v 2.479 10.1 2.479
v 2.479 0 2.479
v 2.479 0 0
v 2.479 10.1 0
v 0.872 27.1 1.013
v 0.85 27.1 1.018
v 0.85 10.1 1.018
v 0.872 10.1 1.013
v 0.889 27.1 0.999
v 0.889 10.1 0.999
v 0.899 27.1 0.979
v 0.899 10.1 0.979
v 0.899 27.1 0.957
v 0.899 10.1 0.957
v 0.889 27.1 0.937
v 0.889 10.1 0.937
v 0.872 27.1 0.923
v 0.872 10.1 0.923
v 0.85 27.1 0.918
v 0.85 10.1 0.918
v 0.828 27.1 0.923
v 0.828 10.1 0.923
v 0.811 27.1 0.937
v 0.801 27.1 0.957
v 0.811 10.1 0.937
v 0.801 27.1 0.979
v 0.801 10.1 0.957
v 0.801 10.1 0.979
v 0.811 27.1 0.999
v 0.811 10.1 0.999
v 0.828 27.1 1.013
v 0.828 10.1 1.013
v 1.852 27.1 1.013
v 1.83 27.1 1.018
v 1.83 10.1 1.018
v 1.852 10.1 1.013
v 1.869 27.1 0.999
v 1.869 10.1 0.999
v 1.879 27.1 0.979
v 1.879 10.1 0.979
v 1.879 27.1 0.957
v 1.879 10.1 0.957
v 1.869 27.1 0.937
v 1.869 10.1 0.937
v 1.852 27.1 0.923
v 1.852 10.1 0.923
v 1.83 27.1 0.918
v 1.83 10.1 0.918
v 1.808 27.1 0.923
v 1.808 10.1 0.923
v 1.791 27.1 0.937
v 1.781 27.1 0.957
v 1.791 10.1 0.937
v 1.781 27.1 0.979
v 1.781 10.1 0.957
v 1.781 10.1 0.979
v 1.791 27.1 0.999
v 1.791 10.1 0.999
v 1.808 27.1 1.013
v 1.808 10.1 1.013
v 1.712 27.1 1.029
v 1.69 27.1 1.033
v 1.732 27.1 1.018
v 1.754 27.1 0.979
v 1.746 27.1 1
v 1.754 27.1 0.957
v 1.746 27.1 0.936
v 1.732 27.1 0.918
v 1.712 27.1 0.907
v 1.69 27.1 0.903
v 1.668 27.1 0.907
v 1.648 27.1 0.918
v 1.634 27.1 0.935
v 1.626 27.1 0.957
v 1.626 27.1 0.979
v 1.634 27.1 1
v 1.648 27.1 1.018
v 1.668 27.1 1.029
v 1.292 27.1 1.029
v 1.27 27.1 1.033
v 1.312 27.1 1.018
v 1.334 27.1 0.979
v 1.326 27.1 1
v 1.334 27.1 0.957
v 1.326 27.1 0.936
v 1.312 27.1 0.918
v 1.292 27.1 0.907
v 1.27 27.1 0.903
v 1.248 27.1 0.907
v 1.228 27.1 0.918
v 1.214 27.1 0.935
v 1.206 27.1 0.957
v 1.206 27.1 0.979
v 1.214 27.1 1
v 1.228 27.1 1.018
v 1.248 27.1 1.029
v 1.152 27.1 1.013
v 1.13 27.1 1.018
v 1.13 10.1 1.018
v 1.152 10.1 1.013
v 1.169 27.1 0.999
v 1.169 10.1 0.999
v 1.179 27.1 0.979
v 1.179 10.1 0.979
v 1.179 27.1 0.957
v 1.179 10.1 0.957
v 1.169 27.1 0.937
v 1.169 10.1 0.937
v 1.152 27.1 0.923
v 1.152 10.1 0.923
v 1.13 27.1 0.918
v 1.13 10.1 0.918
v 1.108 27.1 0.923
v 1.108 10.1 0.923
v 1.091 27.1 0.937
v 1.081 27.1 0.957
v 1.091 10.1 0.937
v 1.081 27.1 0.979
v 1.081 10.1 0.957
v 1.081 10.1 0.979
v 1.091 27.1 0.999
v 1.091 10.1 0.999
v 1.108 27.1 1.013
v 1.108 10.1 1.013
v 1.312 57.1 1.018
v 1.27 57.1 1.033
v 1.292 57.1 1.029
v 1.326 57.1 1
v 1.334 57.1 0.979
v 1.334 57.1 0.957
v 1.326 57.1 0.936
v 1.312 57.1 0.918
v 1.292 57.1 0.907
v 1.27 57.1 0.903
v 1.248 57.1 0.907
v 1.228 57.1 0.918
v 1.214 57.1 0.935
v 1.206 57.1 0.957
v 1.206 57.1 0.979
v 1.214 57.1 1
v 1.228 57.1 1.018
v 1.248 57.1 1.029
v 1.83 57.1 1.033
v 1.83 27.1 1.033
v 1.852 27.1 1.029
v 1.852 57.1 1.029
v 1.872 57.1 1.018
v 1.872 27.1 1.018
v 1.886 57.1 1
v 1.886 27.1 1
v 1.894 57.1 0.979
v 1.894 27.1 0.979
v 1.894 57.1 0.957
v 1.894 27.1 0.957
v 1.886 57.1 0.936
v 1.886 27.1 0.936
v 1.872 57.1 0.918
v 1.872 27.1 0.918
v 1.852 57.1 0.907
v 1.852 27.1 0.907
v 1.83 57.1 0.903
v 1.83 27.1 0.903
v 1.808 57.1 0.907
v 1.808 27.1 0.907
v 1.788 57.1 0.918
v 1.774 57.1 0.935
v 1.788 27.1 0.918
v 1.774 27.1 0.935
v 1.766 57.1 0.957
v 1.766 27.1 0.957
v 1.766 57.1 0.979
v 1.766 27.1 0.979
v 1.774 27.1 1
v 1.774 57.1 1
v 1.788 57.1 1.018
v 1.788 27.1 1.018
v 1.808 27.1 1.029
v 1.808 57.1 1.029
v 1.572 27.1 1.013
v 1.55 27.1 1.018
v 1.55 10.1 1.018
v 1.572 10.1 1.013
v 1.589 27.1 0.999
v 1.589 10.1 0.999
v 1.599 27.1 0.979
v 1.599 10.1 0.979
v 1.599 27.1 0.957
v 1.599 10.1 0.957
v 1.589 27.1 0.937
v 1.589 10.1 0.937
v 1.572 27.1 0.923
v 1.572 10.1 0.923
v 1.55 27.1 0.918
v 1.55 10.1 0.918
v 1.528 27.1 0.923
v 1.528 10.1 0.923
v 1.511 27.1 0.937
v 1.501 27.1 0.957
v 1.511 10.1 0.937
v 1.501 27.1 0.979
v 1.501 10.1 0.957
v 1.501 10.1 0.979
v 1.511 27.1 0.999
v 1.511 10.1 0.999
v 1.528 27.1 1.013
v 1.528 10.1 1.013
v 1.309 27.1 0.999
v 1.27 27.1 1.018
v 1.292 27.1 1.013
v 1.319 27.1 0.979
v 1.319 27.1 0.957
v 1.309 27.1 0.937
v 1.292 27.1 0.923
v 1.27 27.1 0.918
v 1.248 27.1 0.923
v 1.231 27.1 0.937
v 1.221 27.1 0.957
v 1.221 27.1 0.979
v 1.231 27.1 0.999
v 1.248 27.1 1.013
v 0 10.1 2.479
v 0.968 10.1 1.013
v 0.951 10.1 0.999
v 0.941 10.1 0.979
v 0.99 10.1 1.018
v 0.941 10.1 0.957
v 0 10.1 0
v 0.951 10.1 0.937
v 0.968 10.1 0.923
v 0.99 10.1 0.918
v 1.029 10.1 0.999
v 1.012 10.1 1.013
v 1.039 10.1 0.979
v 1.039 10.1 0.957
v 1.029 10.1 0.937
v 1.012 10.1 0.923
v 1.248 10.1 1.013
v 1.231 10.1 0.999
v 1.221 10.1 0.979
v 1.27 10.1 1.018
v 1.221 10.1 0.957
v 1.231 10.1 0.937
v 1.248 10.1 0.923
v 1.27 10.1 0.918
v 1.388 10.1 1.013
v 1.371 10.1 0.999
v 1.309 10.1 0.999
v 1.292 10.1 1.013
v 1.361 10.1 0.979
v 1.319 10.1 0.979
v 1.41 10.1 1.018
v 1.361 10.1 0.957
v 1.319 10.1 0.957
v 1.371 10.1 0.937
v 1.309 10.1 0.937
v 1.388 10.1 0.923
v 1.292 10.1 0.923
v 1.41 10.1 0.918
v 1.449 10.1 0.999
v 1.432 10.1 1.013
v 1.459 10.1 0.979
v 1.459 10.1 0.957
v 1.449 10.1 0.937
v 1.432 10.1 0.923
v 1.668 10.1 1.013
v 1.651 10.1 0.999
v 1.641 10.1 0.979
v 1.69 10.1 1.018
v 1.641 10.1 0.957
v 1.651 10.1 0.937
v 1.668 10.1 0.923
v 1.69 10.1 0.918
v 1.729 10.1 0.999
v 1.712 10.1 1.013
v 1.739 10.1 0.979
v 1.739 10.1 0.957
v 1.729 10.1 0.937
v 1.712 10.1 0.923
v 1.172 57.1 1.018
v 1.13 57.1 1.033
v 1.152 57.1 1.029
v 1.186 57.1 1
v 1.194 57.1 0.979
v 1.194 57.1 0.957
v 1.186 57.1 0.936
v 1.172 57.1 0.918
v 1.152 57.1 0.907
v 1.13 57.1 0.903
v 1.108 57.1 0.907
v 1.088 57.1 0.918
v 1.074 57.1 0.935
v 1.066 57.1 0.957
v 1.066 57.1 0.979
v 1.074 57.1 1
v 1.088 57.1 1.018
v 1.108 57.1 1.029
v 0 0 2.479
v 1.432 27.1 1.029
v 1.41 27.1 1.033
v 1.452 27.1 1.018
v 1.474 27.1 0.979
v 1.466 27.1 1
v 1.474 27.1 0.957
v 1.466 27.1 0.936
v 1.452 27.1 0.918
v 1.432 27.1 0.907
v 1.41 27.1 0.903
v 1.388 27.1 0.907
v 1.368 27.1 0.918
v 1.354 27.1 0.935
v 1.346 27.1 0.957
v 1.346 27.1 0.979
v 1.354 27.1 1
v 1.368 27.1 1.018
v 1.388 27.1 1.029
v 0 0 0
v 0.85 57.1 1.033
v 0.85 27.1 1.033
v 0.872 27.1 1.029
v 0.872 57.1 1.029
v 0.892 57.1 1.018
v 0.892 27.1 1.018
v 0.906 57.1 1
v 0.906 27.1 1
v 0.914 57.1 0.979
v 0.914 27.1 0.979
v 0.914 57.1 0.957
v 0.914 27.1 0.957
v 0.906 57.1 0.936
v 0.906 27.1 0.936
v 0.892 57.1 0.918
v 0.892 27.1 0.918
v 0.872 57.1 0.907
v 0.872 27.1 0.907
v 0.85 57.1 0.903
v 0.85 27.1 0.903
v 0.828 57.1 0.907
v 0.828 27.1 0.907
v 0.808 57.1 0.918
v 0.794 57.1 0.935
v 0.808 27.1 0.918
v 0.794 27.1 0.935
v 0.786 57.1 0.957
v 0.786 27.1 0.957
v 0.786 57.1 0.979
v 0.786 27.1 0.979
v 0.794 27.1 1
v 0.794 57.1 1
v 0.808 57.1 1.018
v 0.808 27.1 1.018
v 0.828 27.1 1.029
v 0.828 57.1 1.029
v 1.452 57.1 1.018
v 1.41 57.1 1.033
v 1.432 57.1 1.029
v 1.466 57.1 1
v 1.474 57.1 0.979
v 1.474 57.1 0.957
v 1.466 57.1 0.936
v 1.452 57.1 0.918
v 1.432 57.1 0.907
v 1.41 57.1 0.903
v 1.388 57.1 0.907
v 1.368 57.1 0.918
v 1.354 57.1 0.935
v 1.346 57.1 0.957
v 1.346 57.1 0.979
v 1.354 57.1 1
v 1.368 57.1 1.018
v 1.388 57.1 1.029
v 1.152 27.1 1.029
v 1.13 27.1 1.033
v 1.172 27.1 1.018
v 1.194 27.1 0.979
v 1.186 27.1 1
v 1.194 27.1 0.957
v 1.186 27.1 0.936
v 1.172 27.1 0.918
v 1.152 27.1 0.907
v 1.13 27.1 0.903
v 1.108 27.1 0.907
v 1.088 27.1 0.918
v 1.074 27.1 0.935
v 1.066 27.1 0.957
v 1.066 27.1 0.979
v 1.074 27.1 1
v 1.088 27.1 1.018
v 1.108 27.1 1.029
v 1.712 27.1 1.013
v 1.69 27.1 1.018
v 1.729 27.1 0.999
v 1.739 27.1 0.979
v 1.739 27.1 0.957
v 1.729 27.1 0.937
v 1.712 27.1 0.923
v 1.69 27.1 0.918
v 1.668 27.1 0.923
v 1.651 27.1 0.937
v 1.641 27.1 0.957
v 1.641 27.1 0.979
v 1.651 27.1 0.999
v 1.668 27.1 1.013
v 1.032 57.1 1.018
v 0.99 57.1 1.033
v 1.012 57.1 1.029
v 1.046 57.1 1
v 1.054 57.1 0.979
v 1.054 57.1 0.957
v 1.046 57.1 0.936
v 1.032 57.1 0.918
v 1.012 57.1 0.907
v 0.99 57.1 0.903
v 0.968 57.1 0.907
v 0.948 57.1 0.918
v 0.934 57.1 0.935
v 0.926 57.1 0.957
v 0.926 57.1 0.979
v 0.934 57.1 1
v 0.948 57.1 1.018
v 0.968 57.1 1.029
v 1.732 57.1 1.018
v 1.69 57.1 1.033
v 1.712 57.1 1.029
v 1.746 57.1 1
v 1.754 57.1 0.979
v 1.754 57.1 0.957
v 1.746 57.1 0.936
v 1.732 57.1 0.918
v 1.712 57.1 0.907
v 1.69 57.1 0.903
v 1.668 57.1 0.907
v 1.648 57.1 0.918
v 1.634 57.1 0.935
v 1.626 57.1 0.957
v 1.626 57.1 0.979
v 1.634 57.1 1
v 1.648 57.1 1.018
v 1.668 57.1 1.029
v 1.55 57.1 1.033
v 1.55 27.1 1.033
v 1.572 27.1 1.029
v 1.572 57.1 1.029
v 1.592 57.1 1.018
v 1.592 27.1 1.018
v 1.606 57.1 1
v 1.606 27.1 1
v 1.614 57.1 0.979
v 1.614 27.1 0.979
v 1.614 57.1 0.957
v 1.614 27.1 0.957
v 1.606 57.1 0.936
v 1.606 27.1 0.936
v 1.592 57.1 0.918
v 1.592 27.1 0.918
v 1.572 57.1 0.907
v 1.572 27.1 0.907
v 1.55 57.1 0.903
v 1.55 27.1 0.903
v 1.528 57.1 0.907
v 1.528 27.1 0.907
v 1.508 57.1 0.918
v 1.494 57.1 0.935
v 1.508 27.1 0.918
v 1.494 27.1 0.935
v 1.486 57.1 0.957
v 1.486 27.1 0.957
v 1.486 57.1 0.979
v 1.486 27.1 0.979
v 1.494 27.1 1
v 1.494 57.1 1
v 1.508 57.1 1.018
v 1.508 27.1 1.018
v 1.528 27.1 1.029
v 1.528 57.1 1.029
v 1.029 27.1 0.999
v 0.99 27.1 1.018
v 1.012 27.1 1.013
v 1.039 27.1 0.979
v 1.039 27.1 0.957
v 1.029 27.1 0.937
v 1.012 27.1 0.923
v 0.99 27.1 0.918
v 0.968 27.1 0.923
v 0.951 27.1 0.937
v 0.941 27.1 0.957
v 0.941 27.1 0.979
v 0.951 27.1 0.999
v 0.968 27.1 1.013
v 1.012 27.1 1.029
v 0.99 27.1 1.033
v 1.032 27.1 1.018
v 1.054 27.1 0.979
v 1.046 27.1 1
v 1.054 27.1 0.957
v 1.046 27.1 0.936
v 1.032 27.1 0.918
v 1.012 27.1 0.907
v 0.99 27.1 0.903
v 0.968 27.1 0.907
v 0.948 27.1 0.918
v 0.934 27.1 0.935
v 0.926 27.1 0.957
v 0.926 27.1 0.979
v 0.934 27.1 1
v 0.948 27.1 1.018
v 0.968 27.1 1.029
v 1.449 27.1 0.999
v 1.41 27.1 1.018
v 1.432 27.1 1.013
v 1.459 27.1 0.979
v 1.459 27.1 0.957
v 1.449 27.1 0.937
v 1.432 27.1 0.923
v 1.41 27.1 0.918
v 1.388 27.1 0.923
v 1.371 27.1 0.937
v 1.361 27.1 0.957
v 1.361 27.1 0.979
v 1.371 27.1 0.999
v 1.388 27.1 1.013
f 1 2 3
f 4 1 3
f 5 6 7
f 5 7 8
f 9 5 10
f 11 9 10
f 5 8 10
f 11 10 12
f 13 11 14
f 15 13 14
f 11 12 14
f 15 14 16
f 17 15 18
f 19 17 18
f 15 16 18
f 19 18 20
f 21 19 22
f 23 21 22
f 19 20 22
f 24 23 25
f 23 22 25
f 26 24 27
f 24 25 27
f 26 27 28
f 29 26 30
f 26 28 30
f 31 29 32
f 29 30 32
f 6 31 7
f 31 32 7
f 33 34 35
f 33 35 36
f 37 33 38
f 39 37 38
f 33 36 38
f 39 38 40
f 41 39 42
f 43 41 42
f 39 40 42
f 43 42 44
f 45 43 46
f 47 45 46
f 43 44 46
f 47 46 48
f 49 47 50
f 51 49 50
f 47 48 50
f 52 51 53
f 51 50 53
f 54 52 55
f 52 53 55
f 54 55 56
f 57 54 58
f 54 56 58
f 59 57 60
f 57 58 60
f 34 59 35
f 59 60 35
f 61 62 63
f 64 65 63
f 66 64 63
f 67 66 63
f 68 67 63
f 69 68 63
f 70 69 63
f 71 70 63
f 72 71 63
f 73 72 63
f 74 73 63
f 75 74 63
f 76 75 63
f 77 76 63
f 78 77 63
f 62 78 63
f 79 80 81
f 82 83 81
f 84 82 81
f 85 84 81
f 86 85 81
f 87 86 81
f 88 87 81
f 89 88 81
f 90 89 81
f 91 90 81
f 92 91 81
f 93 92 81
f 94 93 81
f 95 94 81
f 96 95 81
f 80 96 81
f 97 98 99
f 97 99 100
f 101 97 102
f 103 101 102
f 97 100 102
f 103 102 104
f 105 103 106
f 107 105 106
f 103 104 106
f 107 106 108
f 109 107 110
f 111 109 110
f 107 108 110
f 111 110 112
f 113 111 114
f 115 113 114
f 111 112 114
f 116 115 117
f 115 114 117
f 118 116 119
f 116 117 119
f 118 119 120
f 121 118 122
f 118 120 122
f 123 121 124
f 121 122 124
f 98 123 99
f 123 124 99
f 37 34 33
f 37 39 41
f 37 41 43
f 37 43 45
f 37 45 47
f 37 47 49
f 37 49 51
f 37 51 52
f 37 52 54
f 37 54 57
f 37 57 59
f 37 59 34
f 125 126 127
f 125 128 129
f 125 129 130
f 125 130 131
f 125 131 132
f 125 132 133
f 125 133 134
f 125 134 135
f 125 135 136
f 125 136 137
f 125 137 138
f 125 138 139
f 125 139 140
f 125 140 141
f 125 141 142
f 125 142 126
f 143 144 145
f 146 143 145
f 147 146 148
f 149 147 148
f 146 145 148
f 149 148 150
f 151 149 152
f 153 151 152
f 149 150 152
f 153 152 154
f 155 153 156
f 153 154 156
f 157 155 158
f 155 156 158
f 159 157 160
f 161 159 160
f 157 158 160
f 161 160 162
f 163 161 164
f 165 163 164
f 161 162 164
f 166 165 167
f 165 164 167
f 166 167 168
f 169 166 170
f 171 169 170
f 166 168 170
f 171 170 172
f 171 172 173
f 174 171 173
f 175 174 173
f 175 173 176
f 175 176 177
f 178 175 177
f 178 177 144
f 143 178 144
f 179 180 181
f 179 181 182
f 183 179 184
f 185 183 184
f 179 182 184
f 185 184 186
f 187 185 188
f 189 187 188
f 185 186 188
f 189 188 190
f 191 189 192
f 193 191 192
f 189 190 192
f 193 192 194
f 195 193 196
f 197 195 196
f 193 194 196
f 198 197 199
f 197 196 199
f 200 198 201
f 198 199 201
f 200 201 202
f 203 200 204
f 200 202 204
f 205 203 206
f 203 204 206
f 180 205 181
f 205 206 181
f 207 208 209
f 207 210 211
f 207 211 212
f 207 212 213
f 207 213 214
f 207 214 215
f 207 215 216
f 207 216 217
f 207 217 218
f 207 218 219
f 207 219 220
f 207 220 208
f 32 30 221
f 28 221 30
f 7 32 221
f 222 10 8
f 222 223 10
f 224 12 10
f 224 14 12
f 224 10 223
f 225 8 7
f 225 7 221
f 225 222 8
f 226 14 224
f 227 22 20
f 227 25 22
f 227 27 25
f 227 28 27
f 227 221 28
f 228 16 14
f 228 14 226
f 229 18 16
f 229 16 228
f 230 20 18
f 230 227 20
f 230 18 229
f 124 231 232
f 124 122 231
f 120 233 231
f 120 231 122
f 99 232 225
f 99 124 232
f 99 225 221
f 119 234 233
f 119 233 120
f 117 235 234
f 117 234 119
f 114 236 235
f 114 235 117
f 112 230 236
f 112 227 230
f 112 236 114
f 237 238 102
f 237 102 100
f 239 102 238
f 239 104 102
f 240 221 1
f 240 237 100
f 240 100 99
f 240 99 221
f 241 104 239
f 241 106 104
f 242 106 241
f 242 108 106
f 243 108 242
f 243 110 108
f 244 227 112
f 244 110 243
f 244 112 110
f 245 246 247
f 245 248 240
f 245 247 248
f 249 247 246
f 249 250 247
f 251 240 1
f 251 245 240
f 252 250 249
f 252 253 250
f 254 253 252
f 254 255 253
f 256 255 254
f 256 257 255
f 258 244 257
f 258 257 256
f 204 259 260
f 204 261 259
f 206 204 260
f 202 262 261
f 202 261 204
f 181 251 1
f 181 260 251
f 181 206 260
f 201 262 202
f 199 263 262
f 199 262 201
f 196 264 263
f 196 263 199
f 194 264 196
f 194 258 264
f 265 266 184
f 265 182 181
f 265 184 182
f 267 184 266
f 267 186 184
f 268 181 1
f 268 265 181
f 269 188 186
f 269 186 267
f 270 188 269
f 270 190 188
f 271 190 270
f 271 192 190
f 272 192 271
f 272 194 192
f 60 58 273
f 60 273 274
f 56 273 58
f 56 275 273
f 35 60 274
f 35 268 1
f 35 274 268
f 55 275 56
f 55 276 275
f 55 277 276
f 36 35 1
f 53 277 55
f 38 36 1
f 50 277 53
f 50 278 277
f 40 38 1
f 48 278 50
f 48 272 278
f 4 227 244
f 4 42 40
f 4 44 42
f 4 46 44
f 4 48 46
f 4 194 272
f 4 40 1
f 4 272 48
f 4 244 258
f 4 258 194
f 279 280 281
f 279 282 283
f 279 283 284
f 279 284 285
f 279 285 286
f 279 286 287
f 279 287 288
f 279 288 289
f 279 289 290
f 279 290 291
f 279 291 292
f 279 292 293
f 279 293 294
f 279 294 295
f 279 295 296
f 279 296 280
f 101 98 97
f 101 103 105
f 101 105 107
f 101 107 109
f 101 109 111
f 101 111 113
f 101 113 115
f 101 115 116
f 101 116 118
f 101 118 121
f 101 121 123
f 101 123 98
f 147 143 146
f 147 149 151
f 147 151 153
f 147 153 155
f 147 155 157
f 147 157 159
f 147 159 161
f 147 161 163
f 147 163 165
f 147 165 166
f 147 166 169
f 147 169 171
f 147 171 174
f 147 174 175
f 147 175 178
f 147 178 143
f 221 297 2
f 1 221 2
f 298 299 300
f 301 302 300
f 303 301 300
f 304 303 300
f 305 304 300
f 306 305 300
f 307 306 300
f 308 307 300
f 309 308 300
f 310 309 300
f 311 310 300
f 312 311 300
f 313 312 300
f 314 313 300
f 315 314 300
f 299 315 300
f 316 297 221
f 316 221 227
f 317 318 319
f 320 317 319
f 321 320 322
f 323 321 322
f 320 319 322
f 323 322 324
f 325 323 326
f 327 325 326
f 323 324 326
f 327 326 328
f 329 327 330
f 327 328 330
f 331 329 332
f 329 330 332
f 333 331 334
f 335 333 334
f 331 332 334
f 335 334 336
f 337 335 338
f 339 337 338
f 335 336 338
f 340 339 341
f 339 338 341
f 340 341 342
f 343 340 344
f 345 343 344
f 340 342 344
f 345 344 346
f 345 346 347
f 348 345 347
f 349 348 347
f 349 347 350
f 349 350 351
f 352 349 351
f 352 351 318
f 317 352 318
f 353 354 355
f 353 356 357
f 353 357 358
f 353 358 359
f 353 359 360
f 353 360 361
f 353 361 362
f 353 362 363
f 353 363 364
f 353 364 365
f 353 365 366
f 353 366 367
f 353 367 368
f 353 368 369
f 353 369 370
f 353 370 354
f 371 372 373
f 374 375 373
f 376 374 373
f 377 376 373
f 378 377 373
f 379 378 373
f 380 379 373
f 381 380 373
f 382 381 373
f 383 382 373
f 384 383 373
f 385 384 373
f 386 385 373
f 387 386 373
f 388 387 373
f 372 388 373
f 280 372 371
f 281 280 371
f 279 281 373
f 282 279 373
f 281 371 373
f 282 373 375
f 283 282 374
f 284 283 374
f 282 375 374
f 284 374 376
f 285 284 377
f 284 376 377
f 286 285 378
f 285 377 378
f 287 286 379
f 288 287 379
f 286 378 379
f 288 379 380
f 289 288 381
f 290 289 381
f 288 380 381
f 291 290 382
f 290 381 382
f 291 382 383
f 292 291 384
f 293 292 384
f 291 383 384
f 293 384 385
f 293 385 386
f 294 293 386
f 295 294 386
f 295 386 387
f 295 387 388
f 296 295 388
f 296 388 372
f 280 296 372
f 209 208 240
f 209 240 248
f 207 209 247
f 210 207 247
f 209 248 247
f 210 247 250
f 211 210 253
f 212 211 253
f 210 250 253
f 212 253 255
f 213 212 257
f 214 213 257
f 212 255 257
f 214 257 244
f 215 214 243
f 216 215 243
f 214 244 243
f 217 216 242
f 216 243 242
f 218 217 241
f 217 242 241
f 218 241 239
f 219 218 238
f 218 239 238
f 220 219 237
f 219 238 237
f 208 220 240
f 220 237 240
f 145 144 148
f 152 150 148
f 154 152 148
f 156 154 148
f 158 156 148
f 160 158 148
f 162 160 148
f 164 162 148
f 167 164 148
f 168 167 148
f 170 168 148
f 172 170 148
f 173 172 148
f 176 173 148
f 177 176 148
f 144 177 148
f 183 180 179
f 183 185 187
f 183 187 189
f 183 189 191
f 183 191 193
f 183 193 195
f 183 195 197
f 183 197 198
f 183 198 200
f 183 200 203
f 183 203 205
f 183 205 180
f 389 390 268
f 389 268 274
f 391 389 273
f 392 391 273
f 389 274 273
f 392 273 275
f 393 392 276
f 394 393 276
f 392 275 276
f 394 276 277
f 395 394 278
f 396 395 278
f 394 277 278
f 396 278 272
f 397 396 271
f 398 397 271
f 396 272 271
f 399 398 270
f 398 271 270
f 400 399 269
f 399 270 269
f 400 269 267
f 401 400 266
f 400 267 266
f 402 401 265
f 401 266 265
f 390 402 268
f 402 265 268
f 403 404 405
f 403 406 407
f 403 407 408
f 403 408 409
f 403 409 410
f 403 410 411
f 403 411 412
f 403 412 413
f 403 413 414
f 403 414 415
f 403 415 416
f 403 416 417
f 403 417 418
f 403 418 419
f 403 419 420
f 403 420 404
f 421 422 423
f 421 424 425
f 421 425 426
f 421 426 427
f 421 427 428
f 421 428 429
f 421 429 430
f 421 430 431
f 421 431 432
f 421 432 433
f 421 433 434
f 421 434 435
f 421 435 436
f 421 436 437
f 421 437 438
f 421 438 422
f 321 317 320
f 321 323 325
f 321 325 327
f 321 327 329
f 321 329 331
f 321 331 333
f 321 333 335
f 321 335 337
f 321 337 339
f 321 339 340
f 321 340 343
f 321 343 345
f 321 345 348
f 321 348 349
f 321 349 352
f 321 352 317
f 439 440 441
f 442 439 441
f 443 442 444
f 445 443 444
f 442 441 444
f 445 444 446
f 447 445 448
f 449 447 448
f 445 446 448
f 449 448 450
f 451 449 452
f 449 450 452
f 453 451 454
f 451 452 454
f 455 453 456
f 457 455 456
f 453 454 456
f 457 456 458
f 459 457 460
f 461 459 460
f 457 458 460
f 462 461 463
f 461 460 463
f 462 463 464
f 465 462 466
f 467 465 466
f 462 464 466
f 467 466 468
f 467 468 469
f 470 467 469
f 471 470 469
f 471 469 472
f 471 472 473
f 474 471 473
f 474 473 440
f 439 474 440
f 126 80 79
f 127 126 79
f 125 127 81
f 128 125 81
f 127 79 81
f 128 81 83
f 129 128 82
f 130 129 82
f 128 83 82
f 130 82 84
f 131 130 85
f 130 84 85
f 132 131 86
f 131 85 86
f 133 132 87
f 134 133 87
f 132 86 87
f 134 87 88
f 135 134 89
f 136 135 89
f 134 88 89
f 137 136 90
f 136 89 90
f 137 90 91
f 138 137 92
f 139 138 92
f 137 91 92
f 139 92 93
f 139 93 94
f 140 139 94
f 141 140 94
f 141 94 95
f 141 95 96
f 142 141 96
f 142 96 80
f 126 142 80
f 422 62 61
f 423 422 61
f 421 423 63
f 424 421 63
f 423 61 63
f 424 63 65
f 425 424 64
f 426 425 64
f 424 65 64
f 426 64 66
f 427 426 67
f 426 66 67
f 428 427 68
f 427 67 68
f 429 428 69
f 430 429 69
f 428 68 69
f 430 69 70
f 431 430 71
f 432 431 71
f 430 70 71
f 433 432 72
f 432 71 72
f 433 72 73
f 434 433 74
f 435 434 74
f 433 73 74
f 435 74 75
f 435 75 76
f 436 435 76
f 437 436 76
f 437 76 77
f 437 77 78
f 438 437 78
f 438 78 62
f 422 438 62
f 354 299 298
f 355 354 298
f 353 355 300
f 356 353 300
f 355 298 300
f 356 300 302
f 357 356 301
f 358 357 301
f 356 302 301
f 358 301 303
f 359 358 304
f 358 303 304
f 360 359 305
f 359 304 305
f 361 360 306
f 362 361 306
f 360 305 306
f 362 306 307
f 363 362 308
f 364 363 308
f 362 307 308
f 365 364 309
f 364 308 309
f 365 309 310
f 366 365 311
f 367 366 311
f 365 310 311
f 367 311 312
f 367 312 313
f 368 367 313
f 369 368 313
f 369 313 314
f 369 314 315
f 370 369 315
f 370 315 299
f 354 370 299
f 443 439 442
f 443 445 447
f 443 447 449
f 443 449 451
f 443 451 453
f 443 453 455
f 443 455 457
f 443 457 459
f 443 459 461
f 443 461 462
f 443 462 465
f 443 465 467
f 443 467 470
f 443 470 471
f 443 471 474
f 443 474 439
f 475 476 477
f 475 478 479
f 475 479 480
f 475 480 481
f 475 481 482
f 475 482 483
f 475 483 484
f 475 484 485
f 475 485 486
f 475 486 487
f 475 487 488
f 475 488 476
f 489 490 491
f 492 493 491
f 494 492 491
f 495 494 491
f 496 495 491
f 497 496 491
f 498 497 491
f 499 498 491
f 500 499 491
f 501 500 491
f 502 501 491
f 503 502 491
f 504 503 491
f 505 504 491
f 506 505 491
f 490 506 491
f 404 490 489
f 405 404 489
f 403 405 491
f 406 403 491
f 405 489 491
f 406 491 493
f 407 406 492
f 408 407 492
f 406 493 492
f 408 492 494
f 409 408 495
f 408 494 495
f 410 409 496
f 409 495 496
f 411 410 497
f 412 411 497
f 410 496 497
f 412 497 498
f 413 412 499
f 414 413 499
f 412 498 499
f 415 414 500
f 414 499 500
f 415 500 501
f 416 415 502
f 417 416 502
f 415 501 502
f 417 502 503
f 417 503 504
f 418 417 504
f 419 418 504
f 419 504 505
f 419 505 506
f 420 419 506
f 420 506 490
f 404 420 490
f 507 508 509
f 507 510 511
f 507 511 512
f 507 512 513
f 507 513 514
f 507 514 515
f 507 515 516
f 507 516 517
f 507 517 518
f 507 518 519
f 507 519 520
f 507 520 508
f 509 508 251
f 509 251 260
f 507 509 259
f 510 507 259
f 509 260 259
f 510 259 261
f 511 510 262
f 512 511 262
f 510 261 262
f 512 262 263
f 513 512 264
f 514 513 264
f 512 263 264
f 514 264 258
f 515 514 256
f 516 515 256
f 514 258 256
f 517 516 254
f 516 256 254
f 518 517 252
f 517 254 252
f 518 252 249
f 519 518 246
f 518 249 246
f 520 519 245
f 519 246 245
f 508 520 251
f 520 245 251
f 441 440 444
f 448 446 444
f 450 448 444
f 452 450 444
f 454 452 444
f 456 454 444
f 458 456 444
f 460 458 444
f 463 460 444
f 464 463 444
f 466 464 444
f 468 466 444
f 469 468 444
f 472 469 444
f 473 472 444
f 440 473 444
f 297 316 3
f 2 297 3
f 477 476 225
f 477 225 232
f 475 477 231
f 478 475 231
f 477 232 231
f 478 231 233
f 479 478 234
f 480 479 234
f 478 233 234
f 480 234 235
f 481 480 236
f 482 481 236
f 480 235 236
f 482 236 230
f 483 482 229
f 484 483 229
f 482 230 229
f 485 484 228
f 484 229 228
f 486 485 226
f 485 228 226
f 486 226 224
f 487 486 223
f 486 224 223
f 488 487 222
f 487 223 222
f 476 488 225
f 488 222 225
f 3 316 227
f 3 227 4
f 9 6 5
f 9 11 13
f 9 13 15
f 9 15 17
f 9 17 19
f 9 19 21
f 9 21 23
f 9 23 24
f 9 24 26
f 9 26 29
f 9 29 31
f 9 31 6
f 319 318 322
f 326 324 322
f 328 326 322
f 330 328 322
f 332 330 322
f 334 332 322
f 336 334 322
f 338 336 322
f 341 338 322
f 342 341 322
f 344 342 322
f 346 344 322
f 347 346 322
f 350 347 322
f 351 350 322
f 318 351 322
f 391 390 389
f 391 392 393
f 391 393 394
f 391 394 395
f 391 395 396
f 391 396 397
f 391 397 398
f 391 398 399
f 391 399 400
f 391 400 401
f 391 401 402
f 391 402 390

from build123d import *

# Parameters (mm, degrees)
FIBER_BLOCK_SKETCH_W = 2.47855
FIBER_BLOCK_SKETCH_H = 2.47855
FIBER_BLOCK_DEPTH    = 10.1
FIBER_SKETCH_R       = 0.05
FIBERS_DEPTH         = 17
FIBER_SHIELD_START   = 17
FIBER_SKETCH_3_R     = 0.065
FIBER_SKETCH_3_R_2   = 0.05
FIBER_SHIELD_DEPTH   = 30


with BuildPart() as part:
    # Fiber_Block_sketch → Fiber_Block (new body)
    with BuildSketch(Plane(origin=(0, 0, 0), x_dir=(1, 0, 0), z_dir=(0, 1, 0))):
        with Locations((1.239275, -1.239275)):
            Rectangle(FIBER_BLOCK_SKETCH_W, FIBER_BLOCK_SKETCH_H)
    extrude(amount=FIBER_BLOCK_DEPTH)

    # Fiber_Sketch → Fibers (add)
    with BuildSketch(Plane(origin=(0, 10.1, 0), x_dir=(1, 0, 0), z_dir=(0, 1, 0))):
        with Locations(Location((0.85, -0.968, 0), (0, 0, 270))):
            Circle(FIBER_SKETCH_R)
        with Locations(Location((0.99, -0.968, 0), (0, 0, 270))):
            Circle(FIBER_SKETCH_R)
        with Locations(Location((1.13, -0.968, 0), (0, 0, 270))):
            Circle(FIBER_SKETCH_R)
        with Locations(Location((1.27, -0.968, 0), (0, 0, 270))):
            Circle(FIBER_SKETCH_R)
        with Locations(Location((1.41, -0.968, 0), (0, 0, 270))):
            Circle(FIBER_SKETCH_R)
        with Locations(Location((1.55, -0.968, 0), (0, 0, 270))):
            Circle(FIBER_SKETCH_R)
        with Locations(Location((1.69, -0.968, 0), (0, 0, 270))):
            Circle(FIBER_SKETCH_R)
        with Locations(Location((1.83, -0.968, 0), (0, 0, 270))):
            Circle(FIBER_SKETCH_R)
    extrude(amount=FIBERS_DEPTH)


with BuildPart() as body_2:
    # Fiber_Sketch<3> → Fiber_Shield (new body)
    # profile 1 of 16: a face of its own
    with BuildSketch(Plane(origin=(0, 10.1, 0), x_dir=(1, 0, 0), z_dir=(0, 1, 0)).offset(FIBER_SHIELD_START)):
        with Locations(Location((0.85, -0.968, 0), (0, 0, 270))):
            Circle(FIBER_SKETCH_3_R)
        with Locations(Location((0.85, -0.968, 0), (0, 0, 270))):
            Circle(FIBER_SKETCH_3_R_2, mode=Mode.SUBTRACT)
    # profile 2 of 16: a face of its own
    with BuildSketch(Plane(origin=(0, 10.1, 0), x_dir=(1, 0, 0), z_dir=(0, 1, 0)).offset(FIBER_SHIELD_START)):
        with Locations(Location((0.99, -0.968, 0), (0, 0, 270))):
            Circle(FIBER_SKETCH_3_R)
        with Locations(Location((0.99, -0.968, 0), (0, 0, 270))):
            Circle(FIBER_SKETCH_3_R_2, mode=Mode.SUBTRACT)
    # profile 3 of 16: a face of its own
    with BuildSketch(Plane(origin=(0, 10.1, 0), x_dir=(1, 0, 0), z_dir=(0, 1, 0)).offset(FIBER_SHIELD_START)):
        with Locations(Location((1.13, -0.968, 0), (0, 0, 270))):
            Circle(FIBER_SKETCH_3_R)
        with Locations(Location((1.13, -0.968, 0), (0, 0, 270))):
            Circle(FIBER_SKETCH_3_R_2, mode=Mode.SUBTRACT)
    # profile 4 of 16: a face of its own
    with BuildSketch(Plane(origin=(0, 10.1, 0), x_dir=(1, 0, 0), z_dir=(0, 1, 0)).offset(FIBER_SHIELD_START)):
        with Locations(Location((1.27, -0.968, 0), (0, 0, 270))):
            Circle(FIBER_SKETCH_3_R)
        with Locations(Location((1.27, -0.968, 0), (0, 0, 270))):
            Circle(FIBER_SKETCH_3_R_2, mode=Mode.SUBTRACT)
    # profile 5 of 16: a face of its own
    with BuildSketch(Plane(origin=(0, 10.1, 0), x_dir=(1, 0, 0), z_dir=(0, 1, 0)).offset(FIBER_SHIELD_START)):
        with Locations(Location((1.41, -0.968, 0), (0, 0, 270))):
            Circle(FIBER_SKETCH_3_R)
        with Locations(Location((1.41, -0.968, 0), (0, 0, 270))):
            Circle(FIBER_SKETCH_3_R_2, mode=Mode.SUBTRACT)
    # profile 6 of 16: a face of its own
    with BuildSketch(Plane(origin=(0, 10.1, 0), x_dir=(1, 0, 0), z_dir=(0, 1, 0)).offset(FIBER_SHIELD_START)):
        with Locations(Location((1.55, -0.968, 0), (0, 0, 270))):
            Circle(FIBER_SKETCH_3_R)
        with Locations(Location((1.55, -0.968, 0), (0, 0, 270))):
            Circle(FIBER_SKETCH_3_R_2, mode=Mode.SUBTRACT)
    # profile 7 of 16: a face of its own
    with BuildSketch(Plane(origin=(0, 10.1, 0), x_dir=(1, 0, 0), z_dir=(0, 1, 0)).offset(FIBER_SHIELD_START)):
        with Locations(Location((1.69, -0.968, 0), (0, 0, 270))):
            Circle(FIBER_SKETCH_3_R)
        with Locations(Location((1.69, -0.968, 0), (0, 0, 270))):
            Circle(FIBER_SKETCH_3_R_2, mode=Mode.SUBTRACT)
    # profile 8 of 16: a face of its own
    with BuildSketch(Plane(origin=(0, 10.1, 0), x_dir=(1, 0, 0), z_dir=(0, 1, 0)).offset(FIBER_SHIELD_START)):
        with Locations(Location((1.83, -0.968, 0), (0, 0, 270))):
            Circle(FIBER_SKETCH_3_R)
        with Locations(Location((1.83, -0.968, 0), (0, 0, 270))):
            Circle(FIBER_SKETCH_3_R_2, mode=Mode.SUBTRACT)
    # profile 9 of 16: a face of its own
    with BuildSketch(Plane(origin=(0, 10.1, 0), x_dir=(1, 0, 0), z_dir=(0, 1, 0)).offset(FIBER_SHIELD_START)):
        with Locations(Location((1.83, -0.968, 0), (0, 0, 270))):
            Circle(FIBER_SKETCH_3_R_2)
    # profile 10 of 16: a face of its own
    with BuildSketch(Plane(origin=(0, 10.1, 0), x_dir=(1, 0, 0), z_dir=(0, 1, 0)).offset(FIBER_SHIELD_START)):
        with Locations(Location((1.69, -0.968, 0), (0, 0, 270))):
            Circle(FIBER_SKETCH_3_R_2)
    # profile 11 of 16: a face of its own
    with BuildSketch(Plane(origin=(0, 10.1, 0), x_dir=(1, 0, 0), z_dir=(0, 1, 0)).offset(FIBER_SHIELD_START)):
        with Locations(Location((1.55, -0.968, 0), (0, 0, 270))):
            Circle(FIBER_SKETCH_3_R_2)
    # profile 12 of 16: a face of its own
    with BuildSketch(Plane(origin=(0, 10.1, 0), x_dir=(1, 0, 0), z_dir=(0, 1, 0)).offset(FIBER_SHIELD_START)):
        with Locations(Location((1.41, -0.968, 0), (0, 0, 270))):
            Circle(FIBER_SKETCH_3_R_2)
    # profile 13 of 16: a face of its own
    with BuildSketch(Plane(origin=(0, 10.1, 0), x_dir=(1, 0, 0), z_dir=(0, 1, 0)).offset(FIBER_SHIELD_START)):
        with Locations(Location((1.27, -0.968, 0), (0, 0, 270))):
            Circle(FIBER_SKETCH_3_R_2)
    # profile 14 of 16: a face of its own
    with BuildSketch(Plane(origin=(0, 10.1, 0), x_dir=(1, 0, 0), z_dir=(0, 1, 0)).offset(FIBER_SHIELD_START)):
        with Locations(Location((0.85, -0.968, 0), (0, 0, 270))):
            Circle(FIBER_SKETCH_3_R_2)
    # profile 15 of 16: a face of its own
    with BuildSketch(Plane(origin=(0, 10.1, 0), x_dir=(1, 0, 0), z_dir=(0, 1, 0)).offset(FIBER_SHIELD_START)):
        with Locations(Location((0.99, -0.968, 0), (0, 0, 270))):
            Circle(FIBER_SKETCH_3_R_2)
    # profile 16 of 16: a face of its own
    with BuildSketch(Plane(origin=(0, 10.1, 0), x_dir=(1, 0, 0), z_dir=(0, 1, 0)).offset(FIBER_SHIELD_START)):
        with Locations(Location((1.13, -0.968, 0), (0, 0, 270))):
            Circle(FIBER_SKETCH_3_R_2)
    extrude(amount=FIBER_SHIELD_DEPTH)


solid = Compound([part.part, body_2.part])
